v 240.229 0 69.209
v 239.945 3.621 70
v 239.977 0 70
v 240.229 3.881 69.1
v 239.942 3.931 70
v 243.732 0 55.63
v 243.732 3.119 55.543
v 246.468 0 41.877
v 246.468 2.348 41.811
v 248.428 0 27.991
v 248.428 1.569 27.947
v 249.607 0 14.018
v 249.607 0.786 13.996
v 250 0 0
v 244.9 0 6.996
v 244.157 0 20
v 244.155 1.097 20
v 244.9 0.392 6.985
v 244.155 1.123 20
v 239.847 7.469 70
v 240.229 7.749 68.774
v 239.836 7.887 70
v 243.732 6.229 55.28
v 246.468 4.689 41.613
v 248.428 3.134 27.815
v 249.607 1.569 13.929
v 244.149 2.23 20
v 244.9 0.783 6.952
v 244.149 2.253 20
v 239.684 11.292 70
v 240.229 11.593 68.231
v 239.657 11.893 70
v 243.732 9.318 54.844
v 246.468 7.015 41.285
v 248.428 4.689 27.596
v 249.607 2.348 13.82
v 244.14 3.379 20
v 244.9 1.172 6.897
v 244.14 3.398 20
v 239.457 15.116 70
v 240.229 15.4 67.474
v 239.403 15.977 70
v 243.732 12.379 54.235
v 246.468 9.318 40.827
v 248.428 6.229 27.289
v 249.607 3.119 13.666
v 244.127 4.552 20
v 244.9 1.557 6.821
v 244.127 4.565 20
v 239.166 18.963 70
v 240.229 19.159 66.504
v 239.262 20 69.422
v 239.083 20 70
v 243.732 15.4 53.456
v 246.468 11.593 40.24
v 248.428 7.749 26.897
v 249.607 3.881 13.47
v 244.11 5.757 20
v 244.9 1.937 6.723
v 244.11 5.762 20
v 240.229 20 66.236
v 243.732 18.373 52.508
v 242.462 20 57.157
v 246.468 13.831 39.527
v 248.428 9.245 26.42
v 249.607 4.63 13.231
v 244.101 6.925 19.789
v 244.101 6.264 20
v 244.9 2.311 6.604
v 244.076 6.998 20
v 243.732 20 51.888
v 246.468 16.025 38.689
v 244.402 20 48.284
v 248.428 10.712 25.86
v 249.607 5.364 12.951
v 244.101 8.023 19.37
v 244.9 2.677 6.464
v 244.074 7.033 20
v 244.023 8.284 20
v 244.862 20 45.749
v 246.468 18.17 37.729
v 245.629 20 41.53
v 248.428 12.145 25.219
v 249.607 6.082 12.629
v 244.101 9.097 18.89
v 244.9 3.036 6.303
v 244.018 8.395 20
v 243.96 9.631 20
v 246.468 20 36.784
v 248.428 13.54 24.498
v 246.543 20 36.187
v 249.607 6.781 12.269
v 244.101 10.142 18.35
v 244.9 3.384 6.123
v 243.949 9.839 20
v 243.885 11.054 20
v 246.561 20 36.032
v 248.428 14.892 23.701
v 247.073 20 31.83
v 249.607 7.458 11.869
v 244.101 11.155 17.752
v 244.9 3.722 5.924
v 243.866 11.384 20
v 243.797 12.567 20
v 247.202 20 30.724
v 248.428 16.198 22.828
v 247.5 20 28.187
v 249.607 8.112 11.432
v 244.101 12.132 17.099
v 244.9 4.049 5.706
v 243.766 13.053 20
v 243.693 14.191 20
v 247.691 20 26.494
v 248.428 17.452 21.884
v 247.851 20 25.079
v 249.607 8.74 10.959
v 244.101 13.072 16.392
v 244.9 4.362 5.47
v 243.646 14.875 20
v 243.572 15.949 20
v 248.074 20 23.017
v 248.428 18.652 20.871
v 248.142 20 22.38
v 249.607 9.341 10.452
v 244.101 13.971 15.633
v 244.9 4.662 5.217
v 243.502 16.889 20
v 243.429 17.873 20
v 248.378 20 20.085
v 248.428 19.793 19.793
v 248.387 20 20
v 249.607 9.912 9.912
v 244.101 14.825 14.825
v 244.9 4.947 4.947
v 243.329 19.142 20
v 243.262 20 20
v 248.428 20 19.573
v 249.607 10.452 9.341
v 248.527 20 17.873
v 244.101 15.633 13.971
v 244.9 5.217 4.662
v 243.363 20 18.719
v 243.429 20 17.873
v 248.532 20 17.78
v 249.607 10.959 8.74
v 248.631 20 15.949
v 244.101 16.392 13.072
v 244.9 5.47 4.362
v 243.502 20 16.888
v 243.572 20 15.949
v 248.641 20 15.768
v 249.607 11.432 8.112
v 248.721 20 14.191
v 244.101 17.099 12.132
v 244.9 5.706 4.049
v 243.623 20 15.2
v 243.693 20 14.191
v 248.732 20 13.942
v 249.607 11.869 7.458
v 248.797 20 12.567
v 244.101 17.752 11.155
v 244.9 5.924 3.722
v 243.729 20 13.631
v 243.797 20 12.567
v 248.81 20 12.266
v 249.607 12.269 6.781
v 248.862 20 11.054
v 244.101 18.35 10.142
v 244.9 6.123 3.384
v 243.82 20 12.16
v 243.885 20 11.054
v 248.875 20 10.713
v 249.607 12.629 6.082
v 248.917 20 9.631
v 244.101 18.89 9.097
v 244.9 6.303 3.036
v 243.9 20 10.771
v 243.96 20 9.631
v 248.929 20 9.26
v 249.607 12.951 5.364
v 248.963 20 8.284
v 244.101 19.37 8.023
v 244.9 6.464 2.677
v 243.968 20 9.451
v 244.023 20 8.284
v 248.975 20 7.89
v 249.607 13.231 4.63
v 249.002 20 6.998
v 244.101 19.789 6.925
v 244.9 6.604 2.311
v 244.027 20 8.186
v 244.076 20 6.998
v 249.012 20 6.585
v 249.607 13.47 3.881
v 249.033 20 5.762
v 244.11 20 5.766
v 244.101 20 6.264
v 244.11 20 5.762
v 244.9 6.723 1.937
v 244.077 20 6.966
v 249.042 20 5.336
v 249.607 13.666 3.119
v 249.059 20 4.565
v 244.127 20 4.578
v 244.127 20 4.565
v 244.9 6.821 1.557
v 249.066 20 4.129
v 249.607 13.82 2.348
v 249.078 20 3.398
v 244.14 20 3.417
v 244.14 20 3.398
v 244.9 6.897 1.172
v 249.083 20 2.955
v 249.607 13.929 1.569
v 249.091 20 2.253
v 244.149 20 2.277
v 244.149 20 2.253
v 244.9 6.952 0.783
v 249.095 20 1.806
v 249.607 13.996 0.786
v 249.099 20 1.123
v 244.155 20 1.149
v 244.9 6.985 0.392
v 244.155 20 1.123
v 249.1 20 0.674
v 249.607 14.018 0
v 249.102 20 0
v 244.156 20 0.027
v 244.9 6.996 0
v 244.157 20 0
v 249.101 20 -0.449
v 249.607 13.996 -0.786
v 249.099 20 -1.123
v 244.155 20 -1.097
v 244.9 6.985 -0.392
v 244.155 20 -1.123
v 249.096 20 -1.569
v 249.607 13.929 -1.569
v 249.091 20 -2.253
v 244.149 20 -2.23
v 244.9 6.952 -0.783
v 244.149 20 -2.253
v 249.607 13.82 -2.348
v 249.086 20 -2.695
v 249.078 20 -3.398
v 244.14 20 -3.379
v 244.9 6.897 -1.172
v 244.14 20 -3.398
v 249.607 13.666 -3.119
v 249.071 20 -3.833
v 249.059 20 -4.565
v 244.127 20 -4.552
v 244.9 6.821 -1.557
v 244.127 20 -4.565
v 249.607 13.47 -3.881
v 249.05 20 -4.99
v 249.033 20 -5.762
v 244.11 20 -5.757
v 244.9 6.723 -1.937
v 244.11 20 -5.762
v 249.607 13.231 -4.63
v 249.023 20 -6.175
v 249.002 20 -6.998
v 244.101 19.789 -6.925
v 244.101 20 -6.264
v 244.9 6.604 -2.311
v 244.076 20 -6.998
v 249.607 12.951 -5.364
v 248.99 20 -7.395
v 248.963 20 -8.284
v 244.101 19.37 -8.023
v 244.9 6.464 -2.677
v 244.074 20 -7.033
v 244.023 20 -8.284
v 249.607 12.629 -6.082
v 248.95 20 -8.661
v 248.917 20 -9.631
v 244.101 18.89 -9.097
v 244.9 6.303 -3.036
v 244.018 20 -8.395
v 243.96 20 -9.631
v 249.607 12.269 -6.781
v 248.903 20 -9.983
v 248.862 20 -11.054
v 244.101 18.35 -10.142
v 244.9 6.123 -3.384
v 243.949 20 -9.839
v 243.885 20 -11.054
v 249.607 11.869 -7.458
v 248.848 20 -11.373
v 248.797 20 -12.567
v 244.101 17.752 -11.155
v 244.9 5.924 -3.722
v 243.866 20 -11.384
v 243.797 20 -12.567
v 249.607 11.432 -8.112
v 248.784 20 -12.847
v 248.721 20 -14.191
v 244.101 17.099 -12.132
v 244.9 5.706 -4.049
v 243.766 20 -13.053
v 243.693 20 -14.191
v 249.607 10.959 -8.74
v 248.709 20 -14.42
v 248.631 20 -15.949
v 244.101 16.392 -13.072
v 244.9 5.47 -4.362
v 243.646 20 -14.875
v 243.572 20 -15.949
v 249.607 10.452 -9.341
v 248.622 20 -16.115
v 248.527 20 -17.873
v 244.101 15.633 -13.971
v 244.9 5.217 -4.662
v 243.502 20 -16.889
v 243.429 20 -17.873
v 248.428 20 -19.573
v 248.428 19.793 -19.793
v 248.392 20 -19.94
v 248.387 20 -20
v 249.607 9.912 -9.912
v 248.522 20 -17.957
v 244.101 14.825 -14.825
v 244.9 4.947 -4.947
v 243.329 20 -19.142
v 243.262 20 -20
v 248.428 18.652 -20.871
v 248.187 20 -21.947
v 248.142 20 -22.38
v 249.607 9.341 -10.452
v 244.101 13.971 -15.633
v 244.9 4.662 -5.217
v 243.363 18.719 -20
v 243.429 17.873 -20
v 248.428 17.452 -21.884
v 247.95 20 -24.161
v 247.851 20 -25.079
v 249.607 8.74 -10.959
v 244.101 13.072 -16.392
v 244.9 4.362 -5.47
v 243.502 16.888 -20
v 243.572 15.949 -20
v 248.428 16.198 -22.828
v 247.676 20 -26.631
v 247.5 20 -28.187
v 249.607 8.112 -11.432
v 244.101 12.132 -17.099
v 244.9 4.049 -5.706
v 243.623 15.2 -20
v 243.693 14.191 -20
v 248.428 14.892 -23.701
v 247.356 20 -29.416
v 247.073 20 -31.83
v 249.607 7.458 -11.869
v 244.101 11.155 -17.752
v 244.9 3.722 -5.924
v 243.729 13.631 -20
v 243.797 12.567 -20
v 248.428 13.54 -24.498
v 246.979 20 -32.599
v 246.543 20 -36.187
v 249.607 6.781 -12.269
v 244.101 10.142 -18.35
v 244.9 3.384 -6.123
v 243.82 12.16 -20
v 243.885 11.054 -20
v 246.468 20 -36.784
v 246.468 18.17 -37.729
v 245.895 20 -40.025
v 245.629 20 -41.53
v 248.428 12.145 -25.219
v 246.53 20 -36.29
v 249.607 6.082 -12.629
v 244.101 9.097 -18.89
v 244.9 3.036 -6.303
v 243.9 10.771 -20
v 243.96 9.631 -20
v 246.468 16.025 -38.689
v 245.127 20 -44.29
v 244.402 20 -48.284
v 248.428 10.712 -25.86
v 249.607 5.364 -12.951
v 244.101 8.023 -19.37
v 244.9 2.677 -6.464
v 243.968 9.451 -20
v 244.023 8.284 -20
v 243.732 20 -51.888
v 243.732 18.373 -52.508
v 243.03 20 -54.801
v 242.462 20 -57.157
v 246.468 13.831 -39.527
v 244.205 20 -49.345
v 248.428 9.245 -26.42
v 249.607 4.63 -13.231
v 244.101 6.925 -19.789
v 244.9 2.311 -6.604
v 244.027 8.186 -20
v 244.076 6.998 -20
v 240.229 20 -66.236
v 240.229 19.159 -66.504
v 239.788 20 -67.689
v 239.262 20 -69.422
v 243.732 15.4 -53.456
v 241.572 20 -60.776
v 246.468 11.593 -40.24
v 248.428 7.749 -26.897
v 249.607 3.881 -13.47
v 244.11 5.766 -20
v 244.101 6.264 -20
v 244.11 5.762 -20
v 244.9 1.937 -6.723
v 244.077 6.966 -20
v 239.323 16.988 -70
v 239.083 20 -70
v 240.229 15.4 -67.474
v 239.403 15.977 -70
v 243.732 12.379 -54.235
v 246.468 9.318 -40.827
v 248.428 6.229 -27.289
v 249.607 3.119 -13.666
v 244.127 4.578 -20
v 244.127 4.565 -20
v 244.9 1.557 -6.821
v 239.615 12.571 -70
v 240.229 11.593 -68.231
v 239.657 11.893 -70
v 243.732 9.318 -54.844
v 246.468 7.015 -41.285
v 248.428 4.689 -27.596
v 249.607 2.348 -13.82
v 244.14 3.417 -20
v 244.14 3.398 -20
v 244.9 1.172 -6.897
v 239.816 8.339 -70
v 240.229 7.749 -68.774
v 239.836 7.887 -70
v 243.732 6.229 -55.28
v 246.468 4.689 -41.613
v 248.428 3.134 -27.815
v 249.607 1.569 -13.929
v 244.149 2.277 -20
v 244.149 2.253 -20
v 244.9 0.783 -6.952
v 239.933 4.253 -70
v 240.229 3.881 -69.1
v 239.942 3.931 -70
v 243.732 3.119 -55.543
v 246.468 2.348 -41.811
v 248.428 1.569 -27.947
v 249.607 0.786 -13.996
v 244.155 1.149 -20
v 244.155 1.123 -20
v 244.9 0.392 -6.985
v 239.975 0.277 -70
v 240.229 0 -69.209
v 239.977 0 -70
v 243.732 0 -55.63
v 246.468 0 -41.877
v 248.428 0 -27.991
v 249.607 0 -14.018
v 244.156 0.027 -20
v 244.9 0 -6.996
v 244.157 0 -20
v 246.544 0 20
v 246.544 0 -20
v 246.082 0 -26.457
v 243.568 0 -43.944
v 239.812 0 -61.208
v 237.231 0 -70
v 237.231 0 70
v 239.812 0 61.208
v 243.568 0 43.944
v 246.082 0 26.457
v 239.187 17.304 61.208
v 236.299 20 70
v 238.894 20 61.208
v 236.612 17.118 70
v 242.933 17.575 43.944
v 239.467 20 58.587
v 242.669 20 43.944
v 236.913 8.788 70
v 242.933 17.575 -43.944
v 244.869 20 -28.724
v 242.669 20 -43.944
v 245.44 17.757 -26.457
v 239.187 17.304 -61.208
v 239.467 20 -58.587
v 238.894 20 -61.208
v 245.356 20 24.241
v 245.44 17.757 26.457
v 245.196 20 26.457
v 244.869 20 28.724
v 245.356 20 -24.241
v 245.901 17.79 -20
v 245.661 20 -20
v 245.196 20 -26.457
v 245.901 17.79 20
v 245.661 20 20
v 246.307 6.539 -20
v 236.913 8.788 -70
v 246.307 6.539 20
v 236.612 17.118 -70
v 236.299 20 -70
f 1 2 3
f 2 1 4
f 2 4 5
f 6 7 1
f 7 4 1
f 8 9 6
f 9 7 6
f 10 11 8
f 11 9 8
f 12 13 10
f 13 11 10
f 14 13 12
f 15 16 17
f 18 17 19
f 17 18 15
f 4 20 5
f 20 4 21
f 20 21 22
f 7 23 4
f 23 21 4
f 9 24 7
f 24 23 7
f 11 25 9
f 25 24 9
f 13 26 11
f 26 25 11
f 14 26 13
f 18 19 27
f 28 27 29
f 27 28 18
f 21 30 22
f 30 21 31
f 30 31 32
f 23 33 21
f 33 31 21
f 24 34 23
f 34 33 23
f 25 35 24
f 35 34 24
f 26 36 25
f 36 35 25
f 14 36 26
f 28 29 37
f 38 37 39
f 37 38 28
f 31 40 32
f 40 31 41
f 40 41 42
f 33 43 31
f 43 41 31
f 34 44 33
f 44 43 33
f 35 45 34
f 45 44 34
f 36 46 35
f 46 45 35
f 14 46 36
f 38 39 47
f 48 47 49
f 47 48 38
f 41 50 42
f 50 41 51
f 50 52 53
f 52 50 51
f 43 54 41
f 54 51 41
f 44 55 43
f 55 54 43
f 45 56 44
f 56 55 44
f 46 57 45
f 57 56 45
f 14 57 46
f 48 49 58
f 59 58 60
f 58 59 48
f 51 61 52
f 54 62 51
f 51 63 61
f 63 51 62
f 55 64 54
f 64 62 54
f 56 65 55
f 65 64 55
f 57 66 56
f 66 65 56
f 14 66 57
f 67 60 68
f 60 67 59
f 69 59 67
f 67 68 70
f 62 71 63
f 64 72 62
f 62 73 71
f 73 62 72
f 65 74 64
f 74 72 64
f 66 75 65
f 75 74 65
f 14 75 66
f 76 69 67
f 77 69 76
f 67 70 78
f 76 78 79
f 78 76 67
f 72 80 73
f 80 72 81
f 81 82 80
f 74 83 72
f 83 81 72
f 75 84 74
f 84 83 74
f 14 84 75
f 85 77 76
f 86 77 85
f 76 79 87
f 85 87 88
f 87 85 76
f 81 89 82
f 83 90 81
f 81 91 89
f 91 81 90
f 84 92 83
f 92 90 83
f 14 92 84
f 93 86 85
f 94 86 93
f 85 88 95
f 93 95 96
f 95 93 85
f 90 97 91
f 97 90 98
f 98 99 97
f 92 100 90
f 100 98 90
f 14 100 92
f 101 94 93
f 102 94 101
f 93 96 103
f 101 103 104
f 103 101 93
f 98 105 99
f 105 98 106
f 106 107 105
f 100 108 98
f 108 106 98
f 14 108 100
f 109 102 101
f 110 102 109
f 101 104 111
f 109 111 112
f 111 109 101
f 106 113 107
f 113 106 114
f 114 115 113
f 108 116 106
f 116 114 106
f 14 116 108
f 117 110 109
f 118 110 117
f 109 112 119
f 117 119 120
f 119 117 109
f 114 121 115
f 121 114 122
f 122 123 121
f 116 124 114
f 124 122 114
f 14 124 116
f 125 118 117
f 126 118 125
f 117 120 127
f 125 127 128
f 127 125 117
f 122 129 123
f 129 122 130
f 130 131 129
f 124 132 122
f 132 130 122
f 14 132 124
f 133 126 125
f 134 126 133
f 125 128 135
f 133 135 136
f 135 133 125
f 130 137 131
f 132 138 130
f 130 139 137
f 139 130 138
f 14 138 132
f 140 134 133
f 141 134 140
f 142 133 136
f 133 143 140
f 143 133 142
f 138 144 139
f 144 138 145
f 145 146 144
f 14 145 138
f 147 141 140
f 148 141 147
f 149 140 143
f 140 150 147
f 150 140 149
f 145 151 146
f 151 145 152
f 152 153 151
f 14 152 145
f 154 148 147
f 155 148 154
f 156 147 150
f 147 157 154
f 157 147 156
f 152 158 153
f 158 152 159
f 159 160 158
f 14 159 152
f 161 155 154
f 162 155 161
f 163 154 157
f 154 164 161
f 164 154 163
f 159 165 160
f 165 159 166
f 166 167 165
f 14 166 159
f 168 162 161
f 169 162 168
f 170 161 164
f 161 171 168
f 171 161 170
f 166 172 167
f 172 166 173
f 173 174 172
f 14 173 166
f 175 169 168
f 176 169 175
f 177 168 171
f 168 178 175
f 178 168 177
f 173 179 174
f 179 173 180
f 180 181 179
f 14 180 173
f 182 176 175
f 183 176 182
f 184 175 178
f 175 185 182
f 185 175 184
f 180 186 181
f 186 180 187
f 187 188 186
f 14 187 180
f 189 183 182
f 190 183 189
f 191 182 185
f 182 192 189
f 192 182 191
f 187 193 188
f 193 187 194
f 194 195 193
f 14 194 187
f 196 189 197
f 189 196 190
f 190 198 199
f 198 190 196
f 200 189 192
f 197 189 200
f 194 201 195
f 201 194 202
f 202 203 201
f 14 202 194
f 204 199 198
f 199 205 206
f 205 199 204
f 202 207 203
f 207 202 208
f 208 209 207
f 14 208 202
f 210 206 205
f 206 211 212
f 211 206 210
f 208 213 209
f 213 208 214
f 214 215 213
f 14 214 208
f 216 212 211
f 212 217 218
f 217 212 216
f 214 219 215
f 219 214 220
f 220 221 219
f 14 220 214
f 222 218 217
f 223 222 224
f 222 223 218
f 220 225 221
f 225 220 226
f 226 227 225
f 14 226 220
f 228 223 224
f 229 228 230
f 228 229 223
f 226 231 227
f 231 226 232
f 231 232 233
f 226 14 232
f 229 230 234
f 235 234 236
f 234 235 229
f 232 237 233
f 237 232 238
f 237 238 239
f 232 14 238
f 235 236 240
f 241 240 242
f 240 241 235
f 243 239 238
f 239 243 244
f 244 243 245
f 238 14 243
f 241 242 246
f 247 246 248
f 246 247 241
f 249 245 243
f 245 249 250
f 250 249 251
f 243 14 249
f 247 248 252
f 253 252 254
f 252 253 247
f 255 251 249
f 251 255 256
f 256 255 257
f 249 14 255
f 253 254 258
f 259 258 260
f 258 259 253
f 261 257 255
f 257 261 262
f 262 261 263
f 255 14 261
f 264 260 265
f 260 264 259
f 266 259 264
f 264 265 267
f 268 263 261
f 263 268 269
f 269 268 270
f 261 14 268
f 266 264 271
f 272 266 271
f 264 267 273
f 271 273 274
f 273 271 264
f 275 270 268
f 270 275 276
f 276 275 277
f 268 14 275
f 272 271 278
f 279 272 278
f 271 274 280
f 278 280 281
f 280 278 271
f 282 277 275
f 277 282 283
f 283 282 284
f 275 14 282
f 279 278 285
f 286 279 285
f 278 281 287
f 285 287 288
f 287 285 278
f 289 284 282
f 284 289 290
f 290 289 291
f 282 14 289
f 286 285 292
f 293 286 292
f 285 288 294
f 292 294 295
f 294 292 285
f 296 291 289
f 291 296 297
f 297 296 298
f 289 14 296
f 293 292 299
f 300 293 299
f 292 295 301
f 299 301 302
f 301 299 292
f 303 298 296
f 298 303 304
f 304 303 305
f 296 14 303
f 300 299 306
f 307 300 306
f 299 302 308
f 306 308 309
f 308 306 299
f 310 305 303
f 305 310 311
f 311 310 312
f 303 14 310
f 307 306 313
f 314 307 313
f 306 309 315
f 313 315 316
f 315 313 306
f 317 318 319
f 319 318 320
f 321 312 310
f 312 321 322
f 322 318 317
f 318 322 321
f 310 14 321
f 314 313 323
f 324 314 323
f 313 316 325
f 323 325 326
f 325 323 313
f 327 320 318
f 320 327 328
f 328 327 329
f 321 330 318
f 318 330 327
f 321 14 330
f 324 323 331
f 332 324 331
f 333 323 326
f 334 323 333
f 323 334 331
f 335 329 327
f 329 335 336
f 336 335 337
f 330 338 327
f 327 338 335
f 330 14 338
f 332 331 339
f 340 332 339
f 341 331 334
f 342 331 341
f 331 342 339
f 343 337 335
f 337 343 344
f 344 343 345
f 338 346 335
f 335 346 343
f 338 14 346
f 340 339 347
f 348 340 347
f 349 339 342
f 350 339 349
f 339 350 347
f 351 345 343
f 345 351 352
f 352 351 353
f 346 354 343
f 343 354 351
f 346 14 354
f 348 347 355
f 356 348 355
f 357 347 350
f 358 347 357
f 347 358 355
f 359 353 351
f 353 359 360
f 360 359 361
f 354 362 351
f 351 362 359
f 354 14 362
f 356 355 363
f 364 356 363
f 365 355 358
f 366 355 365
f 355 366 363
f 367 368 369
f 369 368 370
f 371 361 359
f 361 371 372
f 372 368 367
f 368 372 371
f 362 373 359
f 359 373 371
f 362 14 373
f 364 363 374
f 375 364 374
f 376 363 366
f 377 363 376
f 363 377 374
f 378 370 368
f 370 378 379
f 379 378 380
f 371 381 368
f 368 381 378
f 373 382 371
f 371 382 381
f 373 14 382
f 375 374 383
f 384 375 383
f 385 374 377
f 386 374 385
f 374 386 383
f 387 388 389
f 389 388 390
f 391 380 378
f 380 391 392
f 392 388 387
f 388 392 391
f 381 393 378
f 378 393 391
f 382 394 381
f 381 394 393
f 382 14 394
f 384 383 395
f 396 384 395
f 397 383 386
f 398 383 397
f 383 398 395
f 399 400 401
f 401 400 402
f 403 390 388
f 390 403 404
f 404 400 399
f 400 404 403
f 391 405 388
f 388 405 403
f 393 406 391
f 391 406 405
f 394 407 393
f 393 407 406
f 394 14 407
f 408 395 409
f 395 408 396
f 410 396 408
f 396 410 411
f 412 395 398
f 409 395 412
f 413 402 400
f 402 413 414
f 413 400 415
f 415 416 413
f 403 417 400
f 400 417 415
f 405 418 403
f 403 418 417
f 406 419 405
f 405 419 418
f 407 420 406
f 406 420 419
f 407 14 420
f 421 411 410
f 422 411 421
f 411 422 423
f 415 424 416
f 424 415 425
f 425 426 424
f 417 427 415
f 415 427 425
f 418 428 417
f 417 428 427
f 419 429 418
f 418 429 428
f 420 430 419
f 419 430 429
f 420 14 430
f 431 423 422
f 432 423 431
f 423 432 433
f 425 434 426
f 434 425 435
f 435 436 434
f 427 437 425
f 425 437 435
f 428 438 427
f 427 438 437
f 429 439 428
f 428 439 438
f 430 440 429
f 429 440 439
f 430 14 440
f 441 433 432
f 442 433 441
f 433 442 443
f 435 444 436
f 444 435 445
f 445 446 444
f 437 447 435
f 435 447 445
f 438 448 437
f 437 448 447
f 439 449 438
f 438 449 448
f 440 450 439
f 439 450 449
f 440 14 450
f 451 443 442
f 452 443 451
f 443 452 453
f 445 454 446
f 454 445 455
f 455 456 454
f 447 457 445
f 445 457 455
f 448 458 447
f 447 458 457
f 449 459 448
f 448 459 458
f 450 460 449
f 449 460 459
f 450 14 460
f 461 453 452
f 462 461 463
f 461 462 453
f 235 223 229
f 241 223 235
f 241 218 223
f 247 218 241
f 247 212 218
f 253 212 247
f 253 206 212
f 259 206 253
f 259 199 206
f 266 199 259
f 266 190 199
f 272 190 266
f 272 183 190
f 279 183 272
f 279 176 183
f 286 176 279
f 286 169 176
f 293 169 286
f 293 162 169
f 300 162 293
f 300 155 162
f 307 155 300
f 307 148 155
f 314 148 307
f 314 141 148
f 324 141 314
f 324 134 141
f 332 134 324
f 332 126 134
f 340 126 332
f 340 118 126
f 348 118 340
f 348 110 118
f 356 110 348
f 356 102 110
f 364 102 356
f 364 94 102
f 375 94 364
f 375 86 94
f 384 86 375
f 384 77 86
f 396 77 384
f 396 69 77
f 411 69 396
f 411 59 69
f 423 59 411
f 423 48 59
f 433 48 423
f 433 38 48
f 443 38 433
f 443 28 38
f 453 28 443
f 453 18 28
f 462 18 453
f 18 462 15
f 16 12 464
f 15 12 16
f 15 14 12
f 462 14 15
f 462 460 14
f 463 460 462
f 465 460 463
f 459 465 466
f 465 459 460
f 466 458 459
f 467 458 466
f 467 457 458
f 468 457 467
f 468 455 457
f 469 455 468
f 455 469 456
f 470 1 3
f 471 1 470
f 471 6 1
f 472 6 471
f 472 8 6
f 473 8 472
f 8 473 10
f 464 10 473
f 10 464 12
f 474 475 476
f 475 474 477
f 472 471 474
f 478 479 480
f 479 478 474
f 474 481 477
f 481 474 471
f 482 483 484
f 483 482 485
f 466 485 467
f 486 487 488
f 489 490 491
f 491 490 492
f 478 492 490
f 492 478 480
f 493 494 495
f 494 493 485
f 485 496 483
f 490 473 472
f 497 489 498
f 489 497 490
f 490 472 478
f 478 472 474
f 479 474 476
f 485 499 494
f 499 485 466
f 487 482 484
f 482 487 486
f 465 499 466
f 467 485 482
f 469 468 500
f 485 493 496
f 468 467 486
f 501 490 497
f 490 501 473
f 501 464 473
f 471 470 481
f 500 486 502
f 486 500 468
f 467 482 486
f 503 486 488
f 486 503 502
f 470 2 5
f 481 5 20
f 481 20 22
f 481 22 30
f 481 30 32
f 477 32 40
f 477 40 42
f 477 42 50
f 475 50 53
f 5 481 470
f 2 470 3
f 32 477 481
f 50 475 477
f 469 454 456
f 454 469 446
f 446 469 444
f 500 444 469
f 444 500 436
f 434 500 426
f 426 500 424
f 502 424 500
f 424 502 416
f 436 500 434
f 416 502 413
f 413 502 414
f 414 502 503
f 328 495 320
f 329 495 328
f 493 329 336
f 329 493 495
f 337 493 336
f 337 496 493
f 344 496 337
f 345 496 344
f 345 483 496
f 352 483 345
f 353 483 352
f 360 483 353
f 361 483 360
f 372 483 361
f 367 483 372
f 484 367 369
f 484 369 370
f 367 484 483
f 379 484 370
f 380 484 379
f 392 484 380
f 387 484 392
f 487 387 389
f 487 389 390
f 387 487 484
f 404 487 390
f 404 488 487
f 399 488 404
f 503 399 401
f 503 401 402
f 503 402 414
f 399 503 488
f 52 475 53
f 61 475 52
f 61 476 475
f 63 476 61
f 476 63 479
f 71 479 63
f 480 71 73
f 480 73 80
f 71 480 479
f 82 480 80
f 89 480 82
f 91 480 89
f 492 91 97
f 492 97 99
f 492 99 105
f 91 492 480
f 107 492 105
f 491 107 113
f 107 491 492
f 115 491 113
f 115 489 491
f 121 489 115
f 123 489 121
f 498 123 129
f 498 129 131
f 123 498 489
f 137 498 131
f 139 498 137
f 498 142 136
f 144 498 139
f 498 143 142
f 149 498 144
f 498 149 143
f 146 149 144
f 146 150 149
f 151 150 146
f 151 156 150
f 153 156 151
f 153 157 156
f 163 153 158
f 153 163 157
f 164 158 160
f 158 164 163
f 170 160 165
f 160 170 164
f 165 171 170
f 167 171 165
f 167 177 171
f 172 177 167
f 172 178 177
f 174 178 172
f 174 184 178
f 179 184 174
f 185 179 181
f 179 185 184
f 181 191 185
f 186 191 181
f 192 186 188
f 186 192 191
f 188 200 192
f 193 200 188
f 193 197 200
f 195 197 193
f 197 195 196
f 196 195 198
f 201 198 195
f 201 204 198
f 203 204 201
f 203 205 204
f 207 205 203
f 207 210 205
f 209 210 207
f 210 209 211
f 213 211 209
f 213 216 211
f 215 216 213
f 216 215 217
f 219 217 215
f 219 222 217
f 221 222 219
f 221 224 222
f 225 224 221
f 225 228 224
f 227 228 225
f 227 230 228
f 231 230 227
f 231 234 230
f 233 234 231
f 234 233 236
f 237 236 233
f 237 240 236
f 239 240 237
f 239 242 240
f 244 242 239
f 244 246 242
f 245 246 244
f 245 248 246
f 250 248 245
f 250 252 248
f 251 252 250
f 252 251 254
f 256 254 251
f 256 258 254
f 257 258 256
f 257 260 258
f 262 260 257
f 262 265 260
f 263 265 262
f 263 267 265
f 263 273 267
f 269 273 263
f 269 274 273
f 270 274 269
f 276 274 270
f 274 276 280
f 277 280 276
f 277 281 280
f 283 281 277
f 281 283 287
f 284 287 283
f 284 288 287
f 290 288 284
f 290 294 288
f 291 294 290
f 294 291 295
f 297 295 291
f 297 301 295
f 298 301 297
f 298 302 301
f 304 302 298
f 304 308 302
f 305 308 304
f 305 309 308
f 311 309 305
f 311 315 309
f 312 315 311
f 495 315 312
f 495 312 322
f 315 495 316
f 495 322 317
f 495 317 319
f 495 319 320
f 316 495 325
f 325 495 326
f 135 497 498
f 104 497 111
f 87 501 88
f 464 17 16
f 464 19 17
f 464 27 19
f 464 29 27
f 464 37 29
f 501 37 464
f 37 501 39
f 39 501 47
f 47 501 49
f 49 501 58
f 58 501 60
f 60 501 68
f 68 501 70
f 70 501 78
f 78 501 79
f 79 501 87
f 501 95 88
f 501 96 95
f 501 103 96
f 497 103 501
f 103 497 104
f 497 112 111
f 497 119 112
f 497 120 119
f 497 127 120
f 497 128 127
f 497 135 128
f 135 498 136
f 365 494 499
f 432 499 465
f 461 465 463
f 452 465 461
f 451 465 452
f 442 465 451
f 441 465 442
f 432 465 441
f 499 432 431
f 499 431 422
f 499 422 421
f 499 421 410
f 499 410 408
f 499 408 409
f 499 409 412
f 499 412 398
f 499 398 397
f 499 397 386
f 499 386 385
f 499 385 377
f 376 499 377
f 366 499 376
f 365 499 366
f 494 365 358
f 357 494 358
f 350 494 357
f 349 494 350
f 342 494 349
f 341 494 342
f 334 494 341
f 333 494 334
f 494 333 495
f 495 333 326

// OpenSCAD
// file: ../motors/MN5212.scad
use <../utils.scad>

module MN5212(){

	render(){
		translate([0,0, 42.5 / 2 - 23 / 2 - 4.9 - 6])
			cylinder(
				h = 23,
				r = 59 / 2,
				$fa = fa(59 / 2),
				center = true);
		translate([0,0, 42.5 / 2 - 4.9 / 2 - 6])
			cylinder(
				h = 4.9,
				r1 = 59 / 2,
				r2 = 24.8 / 2,
				$fa = fa(59 / 2),
				center = true);
		translate([0,0, - 42.5 / 2 + 5.6 / 2 + 3])
			cylinder(
				h = 5.6,
				r1 = 44 / 2,
				r2 = 59 / 2,
				$fa = fa(59 / 2),
				center = true);
		translate([0, 0, 42.5 / 2 - 3])
			cylinder(
				h = 6,
				r = 4 / 2,
				$fa = fa(4 / 2),
				center = true);
		translate([0, 0, - 42.5 / 2 + 1.5])
			cylinder(
				h = 3,
				r = 6 / 2,
				$fa = fa(6 / 2),
				center = true);
	}

}
// file: ../servos/HS_5065MG.scad
use <../utils.scad>

module HS_5065MG(){

	length = 23.75;
	width = 11.68;
	depth = 20.32;
	wing_width = 32.38;
	wing_thick = 3.43;
	shaft_offset = 6;
	hole_spacing = 28.32;
	shaft_height = 26.16;
	shaft_length = 2;

	module mounting_hole(){
		mh_rad = 2 / 2;
		translate(
			[
				hole_spacing / 2,
				0,
				depth / 2 - wing_thick / 2
			])
			cylinder(h = 5, r = mh_rad, $fa = fa(mh_rad), center = true);
	}

	difference(){
		union(){
			cube([length, width, depth], center = true);
			translate([0, 0, depth / 2 - wing_thick / 2])
				cube([wing_width, width, wing_thick], center = true);
			translate(
				[
					- length / 2 + shaft_offset,
					0,
					shaft_height - length / 2 + shaft_length / 2
				])
				cylinder(
					h = shaft_length,
					r = 1.5,
					$fa = fa(1.5),
					center = true);
		}	union(){

			mounting_hole();
			mirror() mounting_hole();
		}
	}
}

HS_5065MG();
// file: ../servos/LS_0006_servo.scad
// Author Michael Marques (DrYerzinia)

use <../utils.scad>

module ls_0006_servo(){
	
	length = 21.4;
	depth = 19.9;
	thickness = 11.65;

	gear_height = 2.6;
	gear_bump_height = 0.7;
	gear_bump_diameter = 1.97;
	gear_outer_bump_diameter = 6;
	gear_bump_offset = 12.2;

	shaft_height = 2.4;
	shaft_diameter = 3.74;
	shaft_offset = thickness / 2;
	shaft_screw_diameter = 1.3;
	
	wing_outer_width = 8.5;
	wing_top_off = 3.8;
	wing_length = 3.8;
	wing_thickness = 1.2;
	wing_hole_diameter = 1.85;
	wing_hole_edge_dist = 2;

	module wing_hole(){
		translate(
			[
				length / 2 + wing_hole_edge_dist,
				0,
				depth/2 - wing_top_off - wing_thickness / 2
			])
			cylinder(
				h = wing_thickness + 1,
				r = wing_hole_diameter / 2,
				$fn = 16,
				center = true);
	}

	module wing(){
		translate(
			[
				length / 2,
				thickness / 2,
				depth/2 - wing_top_off - wing_thickness
			])
			rotate([0,0,-90])
				trapezoid(
					thickness,
					wing_outer_width,
					wing_length,
					wing_thickness);
	}

	// Body
	cube([length, thickness, depth], center = true);

	difference(){
		union(){

			wing();
			mirror() wing();

			// Gear Bumps
			translate([0, 0, depth/2 + gear_height / 2]){
				translate([length / 2 - gear_bump_offset, 0, 0])
					cylinder(
						h = gear_height,
						r = gear_outer_bump_diameter / 2,
						$fn = 16,
						center = true);
				translate([length / 2 - gear_bump_offset, 0, gear_height/2 + gear_bump_height / 2])
					cylinder(
						h = gear_bump_height,
						r = gear_bump_diameter / 2,
						$fn = 16,
						center = true);
				translate([length / 2 - shaft_offset, 0, 0])
					cylinder(
						h = gear_height,
						r = thickness / 2,
						$fn = 32,
						center = true);
				// Shaft
				translate([length / 2 - shaft_offset, 0, gear_height])
					cylinder(
						h = shaft_height,
						r = shaft_diameter / 2,
						$fn = 16,
						center = true);
			}

		}
		union(){

			wing_hole();
			mirror() wing_hole();

			// Shaft_hole
			translate(
				[
					length / 2 - shaft_offset,
					0,
					depth/2 + gear_height * (3 / 2) + 0.5])
				cylinder(
					h = shaft_height + 1,
					r = shaft_screw_diameter / 2,
					$fn = 16,
					center = true);

		}
	}

}

module translate_ls_0006_attachment(){

	length = 21.4;
	thickness = 11.65;
	shaft_offset = thickness / 2;
	depth = 19.9;
	float = 3.3;

	translate([length / 2 - shaft_offset, 0, depth / 2 + float])
		children();

}

module bar_attachment(){

	height = 3.75;
	bar_length = 14.7;
	bar_thickness = 1.6;
	inner_radius = 5.9;
	outer_radius = 3.95;
	shaft_diameter = 3.7;
	upper_void_diameter = 4.8;
	screw_diameter = 2;
	hole_spacing = 2;
	hole_4_diameter = 1.2;
	hole_diameter = 1;
	hole_start_off = 4.7;
	top_void_depth = 0.67;
	bottom_void_depth = 1.84;

	translate([0, 0, height / 2]){
		difference(){
			union(){

				translate([0, inner_radius / 2, height / 2 - bar_thickness])
					rotate([0,0,-90])
						trapezoid(
							inner_radius,
							outer_radius,
							bar_length,
							bar_thickness);

				cylinder(
					h = height,
					r = inner_radius / 2,
					$fn = 16,
					center = true);

				translate([bar_length, 0, height / 2 - bar_thickness / 2])
					cylinder(
						h = bar_thickness,
						r = outer_radius / 2,
						$fn = 16,
						center = true);

			}
			union(){
				// screwhole
				cylinder(
					h = height + 1,
					r = screw_diameter / 2,
					$fn = 16,
					center = true);
				// voids
				translate([0, 0, height / 2 - top_void_depth / 2 + 0.5])
					cylinder(
						h = top_void_depth + 1,
						r = upper_void_diameter / 2,
						$fn = 16,
						center = true);
				translate([0, 0,  - bottom_void_depth / 2 - 0.5])
					cylinder(
						h = bottom_void_depth + 1,
						r = shaft_diameter / 2,
						$fn = 16,
						center = true);

				for(i = [0:4]){
					dia = (i != 3) ? hole_diameter : hole_4_diameter;
					translate(
						[
							hole_start_off + hole_spacing * i,
							0,
							height / 2 - bar_thickness / 2])
						cylinder(
							h = bar_thickness + 1,
							r = dia / 2,
							$fn = 16,
							center = true);
				}

			}
		}
	}

}

ls_0006_servo();
translate_ls_0006_attachment() bar_attachment();
// file: ../servos/parallax_continuous_rotation_servo.scad
// Author Michael Marques (DrYerzinia)

module parallax_continuous_rotation_servo(){

	depth = 37.7;
	length = 40.75;
	width = 19.75;

	mount_height = 2.7;
	mount_extent = 6.1;
	mount_from_top = 7.7;

	mount_hole_diameter = 4.46;
	mount_hole_spacing = 14.4 - mount_hole_diameter;

	shaft_diameter = 5.8;
	shaft_offset = 10;
	shaft_length = 3.5;

	module mounting_hole(){

			translate(
				[
					length / 2 + 5,
					mount_hole_spacing / 2,
					depth / 2 - mount_height / 2 - mount_from_top
				]
				)
				cylinder(
					h = mount_height + 1,
					r = mount_hole_diameter / 2,
					$fn=16,
					center = true);
	}

	difference(){
		union(){

			// Body
			cube([length,width,depth], center = true);

			// Mounting wings
			translate(
				[
					0,
					0,
					depth / 2 - mount_height / 2 - mount_from_top
				])
				cube(
					[
						length + mount_extent * 2,
						width,
						mount_height
					],
					center = true);

			// Shaft
			translate(
				[
					length / 2 - shaft_offset,
					0,
					depth / 2 + shaft_length / 2
				]
				)
				cylinder(
					h = shaft_length,
					r = shaft_diameter / 2,
					$fn = 16,
					center = true
				);

		}
		union(){

			// Mounting Holes
			mounting_hole();
			mirror()
				mounting_hole();

			translate([0,-mount_hole_spacing,0]){
				mounting_hole();
				mirror()
					mounting_hole();
			}
		}
	}

}

module translate_shaft(){

	depth = 37.7;
	length = 40.75;

	shaft_offset = 10;

	translate(
		[
			length / 2 - shaft_offset,
			0,
			depth / 2
		])
		children();
}

module round_servo_attachment(){

	height = 6;
	diameter = 20.8;
	inner_diameter = 8.6;
	plate_thickness = 2.45;

	float = 2;

	depth = 37.7;
	length = 40.75;

	shaft_offset = 10;

	plate_hole_spacing = 14.5;
	plate_hole_diameter = 1.4;
	plate_hole_minor_spacing = 3.5;

	screw_hole_diameter = 3;

	inner_diameter = 8;
	
	top_depth = 1.8;
	bottom_depth = 3.4;

	void_diameter = 5.8;

	module plate_hole(){
		cylinder(
			h = plate_thickness + 1,
			r = plate_hole_diameter / 2,
			$fn = 16,
			center = true
		);
	}

	module plate_hole_group(){
		translate([0, 0, height / 2 - plate_thickness / 2]){
			translate([0, plate_hole_spacing / 2, 0]){
					plate_hole();
					translate([- plate_hole_minor_spacing, 0, 0])
						plate_hole();
					translate([  plate_hole_minor_spacing, 0, 0])
						plate_hole();
			}
		}
	}

	translate(
		[
			length / 2 - shaft_offset,
			0,
			depth / 2 + height / 2 + float
		]
		)
		difference(){

			union(){

				// inner shaft
				cylinder(
					h = height,
					r = inner_diameter / 2,
					$fn = 16,
					center = true
				);

				// top
				translate([0, 0, height / 2 - plate_thickness / 2])
					cylinder(
						h = plate_thickness,
						r = diameter / 2,
						$fn = 32,
						center = true
					);
			}

			union(){

				// plate holes
				for(ang = [0:3]){
					rotate([0,0, ang * 90])
						plate_hole_group();
				}

				// screw hole
				cylinder(
					h = height + 1,
					r = screw_hole_diameter / 2,
					$fn = 16,
					center = true
				);

				// inner voids
				translate([0, 0, height / 2 - top_depth / 2 + 1])
					cylinder(
						h = top_depth + 1,
						r = void_diameter / 2,
						$fn = 16,
						center = true
					);
				translate([0, 0, -1])
					cylinder(
						h = bottom_depth + 1,
						r = void_diameter / 2,
						$fn = 16,
						center = true
					);

			}

		}

}

parallax_continuous_rotation_servo();
round_servo_attachment();
// file: ../hardware.scad
 // Author Michael Marques (DrYerzinia)

// http://www.ebay.com/itm/10-PCS-683-3x7x2-mm-Metal-OPEN-PRECISION-Miniature-Ball-Bearing-3-7-2-/291206307942?hash=item43cd3fa066:m:mCi6eovrGVk_CjIUjlhw8yg
// E-Bay empire.rc

module washer_M3_7x3_2x0_5mm(){

	difference(){
		cylinder(
			h = 0.5,
			r = 7 / 2,
			$fn = 16,
			center = true);
		cylinder(
			h = 0.5 + 0.1,
			r = 3.2 / 2,
			$fn = 16,
			center = true);
	}

}

module bearing_3x7x2mm(){

	difference(){
		cylinder(
			h = 2,
			r = 7 / 2,
			$fn = 16,
			center = true);
		cylinder(
			h = 2 + 1,
			r = 3 / 2,
			$fn = 16,
			center = true);
	}

}

module bearing_5x8x2_5mm(){

	difference(){
		cylinder(
			h = 2.5,
			r = 8 / 2,
			$fn = 16,
			center = true);
		cylinder(
			h = 2.5 + 1,
			r = 5 / 2,
			$fn = 16,
			center = true);
	}

}

module bearing_8x16x5mm(){

	difference(){
		cylinder(
			h = 5,
			r = 16 / 2,
			$fn = 16,
			center = true);
		cylinder(
			h = 5 + 1,
			r = 8 / 2,
			$fn = 16,
			center = true);
	}

}


bearing_5x8x2_5mm();
// file: ../utils.scad
// http://forum.openscad.org/Creating-pie-pizza-slice-shape-need-a-dynamic-length-array-td3148.html

module pie_slice(r, start_angle, end_angle) {
    R = r * sqrt(2) + 1;
    a0 = (4 * start_angle + 0 * end_angle) / 4;
    a1 = (3 * start_angle + 1 * end_angle) / 4;
    a2 = (2 * start_angle + 2 * end_angle) / 4;
    a3 = (1 * start_angle + 3 * end_angle) / 4;
    a4 = (0 * start_angle + 4 * end_angle) / 4;
    if(end_angle > start_angle)
        intersection() {
        circle(r, $fa = fa(r));
        polygon([
            [0,0],
            [R * cos(a0), R * sin(a0)],
            [R * cos(a1), R * sin(a1)],
            [R * cos(a2), R * sin(a2)],
            [R * cos(a3), R * sin(a3)],
            [R * cos(a4), R * sin(a4)],
            [0,0]
       ]);
    }
}

// https://github.com/openscad/openscad/issues/29

module rotate_about(v,a) {
	translate(v) rotate(a) translate(-v) children(0);
}

module rotate_about_axis(v, ang, axis) {
	translate(v) rotate(ang, axis) translate(-v) children(0);
}

// https://github.com/robofun/openscad-utils/blob/master/trapezoid.scad

module trapezoid(width_base, width_top,height,thickness) {
	

  linear_extrude(height = thickness) polygon(points=[[0,0],[width_base,0],[width_base-(width_base-width_top)/2,height],[(width_base-width_top)/2,height]], paths=[[0,1,2,3]]); 
  
}

// http://forum.openscad.org/fe-Tolerance-based-arc-approximation-td14212.html

function fa(r)=($fn>0)?360/$fn:($fe>0)?($fe<r)?min(45,2*acos(1-$fe/r)):45:$fa; 
// file: ../render_settings.scad
// Author Michael Marques (DrYerzinia)

// Lulzbot Mini tolerances
// x/y 0.1mm
// z   0.05mm
//
// 0.1mm   preview tolerance
// 0.025mm export  tolerance

$fs = 0.01;
$fn = undef;
$fa = 360 / 5;

$fe = 0.025;	// export
// main file
// Author Michael Marques (DrYerzinia)

include <../render_settings.scad>

use <../BB8.scad>

Door_P4();
